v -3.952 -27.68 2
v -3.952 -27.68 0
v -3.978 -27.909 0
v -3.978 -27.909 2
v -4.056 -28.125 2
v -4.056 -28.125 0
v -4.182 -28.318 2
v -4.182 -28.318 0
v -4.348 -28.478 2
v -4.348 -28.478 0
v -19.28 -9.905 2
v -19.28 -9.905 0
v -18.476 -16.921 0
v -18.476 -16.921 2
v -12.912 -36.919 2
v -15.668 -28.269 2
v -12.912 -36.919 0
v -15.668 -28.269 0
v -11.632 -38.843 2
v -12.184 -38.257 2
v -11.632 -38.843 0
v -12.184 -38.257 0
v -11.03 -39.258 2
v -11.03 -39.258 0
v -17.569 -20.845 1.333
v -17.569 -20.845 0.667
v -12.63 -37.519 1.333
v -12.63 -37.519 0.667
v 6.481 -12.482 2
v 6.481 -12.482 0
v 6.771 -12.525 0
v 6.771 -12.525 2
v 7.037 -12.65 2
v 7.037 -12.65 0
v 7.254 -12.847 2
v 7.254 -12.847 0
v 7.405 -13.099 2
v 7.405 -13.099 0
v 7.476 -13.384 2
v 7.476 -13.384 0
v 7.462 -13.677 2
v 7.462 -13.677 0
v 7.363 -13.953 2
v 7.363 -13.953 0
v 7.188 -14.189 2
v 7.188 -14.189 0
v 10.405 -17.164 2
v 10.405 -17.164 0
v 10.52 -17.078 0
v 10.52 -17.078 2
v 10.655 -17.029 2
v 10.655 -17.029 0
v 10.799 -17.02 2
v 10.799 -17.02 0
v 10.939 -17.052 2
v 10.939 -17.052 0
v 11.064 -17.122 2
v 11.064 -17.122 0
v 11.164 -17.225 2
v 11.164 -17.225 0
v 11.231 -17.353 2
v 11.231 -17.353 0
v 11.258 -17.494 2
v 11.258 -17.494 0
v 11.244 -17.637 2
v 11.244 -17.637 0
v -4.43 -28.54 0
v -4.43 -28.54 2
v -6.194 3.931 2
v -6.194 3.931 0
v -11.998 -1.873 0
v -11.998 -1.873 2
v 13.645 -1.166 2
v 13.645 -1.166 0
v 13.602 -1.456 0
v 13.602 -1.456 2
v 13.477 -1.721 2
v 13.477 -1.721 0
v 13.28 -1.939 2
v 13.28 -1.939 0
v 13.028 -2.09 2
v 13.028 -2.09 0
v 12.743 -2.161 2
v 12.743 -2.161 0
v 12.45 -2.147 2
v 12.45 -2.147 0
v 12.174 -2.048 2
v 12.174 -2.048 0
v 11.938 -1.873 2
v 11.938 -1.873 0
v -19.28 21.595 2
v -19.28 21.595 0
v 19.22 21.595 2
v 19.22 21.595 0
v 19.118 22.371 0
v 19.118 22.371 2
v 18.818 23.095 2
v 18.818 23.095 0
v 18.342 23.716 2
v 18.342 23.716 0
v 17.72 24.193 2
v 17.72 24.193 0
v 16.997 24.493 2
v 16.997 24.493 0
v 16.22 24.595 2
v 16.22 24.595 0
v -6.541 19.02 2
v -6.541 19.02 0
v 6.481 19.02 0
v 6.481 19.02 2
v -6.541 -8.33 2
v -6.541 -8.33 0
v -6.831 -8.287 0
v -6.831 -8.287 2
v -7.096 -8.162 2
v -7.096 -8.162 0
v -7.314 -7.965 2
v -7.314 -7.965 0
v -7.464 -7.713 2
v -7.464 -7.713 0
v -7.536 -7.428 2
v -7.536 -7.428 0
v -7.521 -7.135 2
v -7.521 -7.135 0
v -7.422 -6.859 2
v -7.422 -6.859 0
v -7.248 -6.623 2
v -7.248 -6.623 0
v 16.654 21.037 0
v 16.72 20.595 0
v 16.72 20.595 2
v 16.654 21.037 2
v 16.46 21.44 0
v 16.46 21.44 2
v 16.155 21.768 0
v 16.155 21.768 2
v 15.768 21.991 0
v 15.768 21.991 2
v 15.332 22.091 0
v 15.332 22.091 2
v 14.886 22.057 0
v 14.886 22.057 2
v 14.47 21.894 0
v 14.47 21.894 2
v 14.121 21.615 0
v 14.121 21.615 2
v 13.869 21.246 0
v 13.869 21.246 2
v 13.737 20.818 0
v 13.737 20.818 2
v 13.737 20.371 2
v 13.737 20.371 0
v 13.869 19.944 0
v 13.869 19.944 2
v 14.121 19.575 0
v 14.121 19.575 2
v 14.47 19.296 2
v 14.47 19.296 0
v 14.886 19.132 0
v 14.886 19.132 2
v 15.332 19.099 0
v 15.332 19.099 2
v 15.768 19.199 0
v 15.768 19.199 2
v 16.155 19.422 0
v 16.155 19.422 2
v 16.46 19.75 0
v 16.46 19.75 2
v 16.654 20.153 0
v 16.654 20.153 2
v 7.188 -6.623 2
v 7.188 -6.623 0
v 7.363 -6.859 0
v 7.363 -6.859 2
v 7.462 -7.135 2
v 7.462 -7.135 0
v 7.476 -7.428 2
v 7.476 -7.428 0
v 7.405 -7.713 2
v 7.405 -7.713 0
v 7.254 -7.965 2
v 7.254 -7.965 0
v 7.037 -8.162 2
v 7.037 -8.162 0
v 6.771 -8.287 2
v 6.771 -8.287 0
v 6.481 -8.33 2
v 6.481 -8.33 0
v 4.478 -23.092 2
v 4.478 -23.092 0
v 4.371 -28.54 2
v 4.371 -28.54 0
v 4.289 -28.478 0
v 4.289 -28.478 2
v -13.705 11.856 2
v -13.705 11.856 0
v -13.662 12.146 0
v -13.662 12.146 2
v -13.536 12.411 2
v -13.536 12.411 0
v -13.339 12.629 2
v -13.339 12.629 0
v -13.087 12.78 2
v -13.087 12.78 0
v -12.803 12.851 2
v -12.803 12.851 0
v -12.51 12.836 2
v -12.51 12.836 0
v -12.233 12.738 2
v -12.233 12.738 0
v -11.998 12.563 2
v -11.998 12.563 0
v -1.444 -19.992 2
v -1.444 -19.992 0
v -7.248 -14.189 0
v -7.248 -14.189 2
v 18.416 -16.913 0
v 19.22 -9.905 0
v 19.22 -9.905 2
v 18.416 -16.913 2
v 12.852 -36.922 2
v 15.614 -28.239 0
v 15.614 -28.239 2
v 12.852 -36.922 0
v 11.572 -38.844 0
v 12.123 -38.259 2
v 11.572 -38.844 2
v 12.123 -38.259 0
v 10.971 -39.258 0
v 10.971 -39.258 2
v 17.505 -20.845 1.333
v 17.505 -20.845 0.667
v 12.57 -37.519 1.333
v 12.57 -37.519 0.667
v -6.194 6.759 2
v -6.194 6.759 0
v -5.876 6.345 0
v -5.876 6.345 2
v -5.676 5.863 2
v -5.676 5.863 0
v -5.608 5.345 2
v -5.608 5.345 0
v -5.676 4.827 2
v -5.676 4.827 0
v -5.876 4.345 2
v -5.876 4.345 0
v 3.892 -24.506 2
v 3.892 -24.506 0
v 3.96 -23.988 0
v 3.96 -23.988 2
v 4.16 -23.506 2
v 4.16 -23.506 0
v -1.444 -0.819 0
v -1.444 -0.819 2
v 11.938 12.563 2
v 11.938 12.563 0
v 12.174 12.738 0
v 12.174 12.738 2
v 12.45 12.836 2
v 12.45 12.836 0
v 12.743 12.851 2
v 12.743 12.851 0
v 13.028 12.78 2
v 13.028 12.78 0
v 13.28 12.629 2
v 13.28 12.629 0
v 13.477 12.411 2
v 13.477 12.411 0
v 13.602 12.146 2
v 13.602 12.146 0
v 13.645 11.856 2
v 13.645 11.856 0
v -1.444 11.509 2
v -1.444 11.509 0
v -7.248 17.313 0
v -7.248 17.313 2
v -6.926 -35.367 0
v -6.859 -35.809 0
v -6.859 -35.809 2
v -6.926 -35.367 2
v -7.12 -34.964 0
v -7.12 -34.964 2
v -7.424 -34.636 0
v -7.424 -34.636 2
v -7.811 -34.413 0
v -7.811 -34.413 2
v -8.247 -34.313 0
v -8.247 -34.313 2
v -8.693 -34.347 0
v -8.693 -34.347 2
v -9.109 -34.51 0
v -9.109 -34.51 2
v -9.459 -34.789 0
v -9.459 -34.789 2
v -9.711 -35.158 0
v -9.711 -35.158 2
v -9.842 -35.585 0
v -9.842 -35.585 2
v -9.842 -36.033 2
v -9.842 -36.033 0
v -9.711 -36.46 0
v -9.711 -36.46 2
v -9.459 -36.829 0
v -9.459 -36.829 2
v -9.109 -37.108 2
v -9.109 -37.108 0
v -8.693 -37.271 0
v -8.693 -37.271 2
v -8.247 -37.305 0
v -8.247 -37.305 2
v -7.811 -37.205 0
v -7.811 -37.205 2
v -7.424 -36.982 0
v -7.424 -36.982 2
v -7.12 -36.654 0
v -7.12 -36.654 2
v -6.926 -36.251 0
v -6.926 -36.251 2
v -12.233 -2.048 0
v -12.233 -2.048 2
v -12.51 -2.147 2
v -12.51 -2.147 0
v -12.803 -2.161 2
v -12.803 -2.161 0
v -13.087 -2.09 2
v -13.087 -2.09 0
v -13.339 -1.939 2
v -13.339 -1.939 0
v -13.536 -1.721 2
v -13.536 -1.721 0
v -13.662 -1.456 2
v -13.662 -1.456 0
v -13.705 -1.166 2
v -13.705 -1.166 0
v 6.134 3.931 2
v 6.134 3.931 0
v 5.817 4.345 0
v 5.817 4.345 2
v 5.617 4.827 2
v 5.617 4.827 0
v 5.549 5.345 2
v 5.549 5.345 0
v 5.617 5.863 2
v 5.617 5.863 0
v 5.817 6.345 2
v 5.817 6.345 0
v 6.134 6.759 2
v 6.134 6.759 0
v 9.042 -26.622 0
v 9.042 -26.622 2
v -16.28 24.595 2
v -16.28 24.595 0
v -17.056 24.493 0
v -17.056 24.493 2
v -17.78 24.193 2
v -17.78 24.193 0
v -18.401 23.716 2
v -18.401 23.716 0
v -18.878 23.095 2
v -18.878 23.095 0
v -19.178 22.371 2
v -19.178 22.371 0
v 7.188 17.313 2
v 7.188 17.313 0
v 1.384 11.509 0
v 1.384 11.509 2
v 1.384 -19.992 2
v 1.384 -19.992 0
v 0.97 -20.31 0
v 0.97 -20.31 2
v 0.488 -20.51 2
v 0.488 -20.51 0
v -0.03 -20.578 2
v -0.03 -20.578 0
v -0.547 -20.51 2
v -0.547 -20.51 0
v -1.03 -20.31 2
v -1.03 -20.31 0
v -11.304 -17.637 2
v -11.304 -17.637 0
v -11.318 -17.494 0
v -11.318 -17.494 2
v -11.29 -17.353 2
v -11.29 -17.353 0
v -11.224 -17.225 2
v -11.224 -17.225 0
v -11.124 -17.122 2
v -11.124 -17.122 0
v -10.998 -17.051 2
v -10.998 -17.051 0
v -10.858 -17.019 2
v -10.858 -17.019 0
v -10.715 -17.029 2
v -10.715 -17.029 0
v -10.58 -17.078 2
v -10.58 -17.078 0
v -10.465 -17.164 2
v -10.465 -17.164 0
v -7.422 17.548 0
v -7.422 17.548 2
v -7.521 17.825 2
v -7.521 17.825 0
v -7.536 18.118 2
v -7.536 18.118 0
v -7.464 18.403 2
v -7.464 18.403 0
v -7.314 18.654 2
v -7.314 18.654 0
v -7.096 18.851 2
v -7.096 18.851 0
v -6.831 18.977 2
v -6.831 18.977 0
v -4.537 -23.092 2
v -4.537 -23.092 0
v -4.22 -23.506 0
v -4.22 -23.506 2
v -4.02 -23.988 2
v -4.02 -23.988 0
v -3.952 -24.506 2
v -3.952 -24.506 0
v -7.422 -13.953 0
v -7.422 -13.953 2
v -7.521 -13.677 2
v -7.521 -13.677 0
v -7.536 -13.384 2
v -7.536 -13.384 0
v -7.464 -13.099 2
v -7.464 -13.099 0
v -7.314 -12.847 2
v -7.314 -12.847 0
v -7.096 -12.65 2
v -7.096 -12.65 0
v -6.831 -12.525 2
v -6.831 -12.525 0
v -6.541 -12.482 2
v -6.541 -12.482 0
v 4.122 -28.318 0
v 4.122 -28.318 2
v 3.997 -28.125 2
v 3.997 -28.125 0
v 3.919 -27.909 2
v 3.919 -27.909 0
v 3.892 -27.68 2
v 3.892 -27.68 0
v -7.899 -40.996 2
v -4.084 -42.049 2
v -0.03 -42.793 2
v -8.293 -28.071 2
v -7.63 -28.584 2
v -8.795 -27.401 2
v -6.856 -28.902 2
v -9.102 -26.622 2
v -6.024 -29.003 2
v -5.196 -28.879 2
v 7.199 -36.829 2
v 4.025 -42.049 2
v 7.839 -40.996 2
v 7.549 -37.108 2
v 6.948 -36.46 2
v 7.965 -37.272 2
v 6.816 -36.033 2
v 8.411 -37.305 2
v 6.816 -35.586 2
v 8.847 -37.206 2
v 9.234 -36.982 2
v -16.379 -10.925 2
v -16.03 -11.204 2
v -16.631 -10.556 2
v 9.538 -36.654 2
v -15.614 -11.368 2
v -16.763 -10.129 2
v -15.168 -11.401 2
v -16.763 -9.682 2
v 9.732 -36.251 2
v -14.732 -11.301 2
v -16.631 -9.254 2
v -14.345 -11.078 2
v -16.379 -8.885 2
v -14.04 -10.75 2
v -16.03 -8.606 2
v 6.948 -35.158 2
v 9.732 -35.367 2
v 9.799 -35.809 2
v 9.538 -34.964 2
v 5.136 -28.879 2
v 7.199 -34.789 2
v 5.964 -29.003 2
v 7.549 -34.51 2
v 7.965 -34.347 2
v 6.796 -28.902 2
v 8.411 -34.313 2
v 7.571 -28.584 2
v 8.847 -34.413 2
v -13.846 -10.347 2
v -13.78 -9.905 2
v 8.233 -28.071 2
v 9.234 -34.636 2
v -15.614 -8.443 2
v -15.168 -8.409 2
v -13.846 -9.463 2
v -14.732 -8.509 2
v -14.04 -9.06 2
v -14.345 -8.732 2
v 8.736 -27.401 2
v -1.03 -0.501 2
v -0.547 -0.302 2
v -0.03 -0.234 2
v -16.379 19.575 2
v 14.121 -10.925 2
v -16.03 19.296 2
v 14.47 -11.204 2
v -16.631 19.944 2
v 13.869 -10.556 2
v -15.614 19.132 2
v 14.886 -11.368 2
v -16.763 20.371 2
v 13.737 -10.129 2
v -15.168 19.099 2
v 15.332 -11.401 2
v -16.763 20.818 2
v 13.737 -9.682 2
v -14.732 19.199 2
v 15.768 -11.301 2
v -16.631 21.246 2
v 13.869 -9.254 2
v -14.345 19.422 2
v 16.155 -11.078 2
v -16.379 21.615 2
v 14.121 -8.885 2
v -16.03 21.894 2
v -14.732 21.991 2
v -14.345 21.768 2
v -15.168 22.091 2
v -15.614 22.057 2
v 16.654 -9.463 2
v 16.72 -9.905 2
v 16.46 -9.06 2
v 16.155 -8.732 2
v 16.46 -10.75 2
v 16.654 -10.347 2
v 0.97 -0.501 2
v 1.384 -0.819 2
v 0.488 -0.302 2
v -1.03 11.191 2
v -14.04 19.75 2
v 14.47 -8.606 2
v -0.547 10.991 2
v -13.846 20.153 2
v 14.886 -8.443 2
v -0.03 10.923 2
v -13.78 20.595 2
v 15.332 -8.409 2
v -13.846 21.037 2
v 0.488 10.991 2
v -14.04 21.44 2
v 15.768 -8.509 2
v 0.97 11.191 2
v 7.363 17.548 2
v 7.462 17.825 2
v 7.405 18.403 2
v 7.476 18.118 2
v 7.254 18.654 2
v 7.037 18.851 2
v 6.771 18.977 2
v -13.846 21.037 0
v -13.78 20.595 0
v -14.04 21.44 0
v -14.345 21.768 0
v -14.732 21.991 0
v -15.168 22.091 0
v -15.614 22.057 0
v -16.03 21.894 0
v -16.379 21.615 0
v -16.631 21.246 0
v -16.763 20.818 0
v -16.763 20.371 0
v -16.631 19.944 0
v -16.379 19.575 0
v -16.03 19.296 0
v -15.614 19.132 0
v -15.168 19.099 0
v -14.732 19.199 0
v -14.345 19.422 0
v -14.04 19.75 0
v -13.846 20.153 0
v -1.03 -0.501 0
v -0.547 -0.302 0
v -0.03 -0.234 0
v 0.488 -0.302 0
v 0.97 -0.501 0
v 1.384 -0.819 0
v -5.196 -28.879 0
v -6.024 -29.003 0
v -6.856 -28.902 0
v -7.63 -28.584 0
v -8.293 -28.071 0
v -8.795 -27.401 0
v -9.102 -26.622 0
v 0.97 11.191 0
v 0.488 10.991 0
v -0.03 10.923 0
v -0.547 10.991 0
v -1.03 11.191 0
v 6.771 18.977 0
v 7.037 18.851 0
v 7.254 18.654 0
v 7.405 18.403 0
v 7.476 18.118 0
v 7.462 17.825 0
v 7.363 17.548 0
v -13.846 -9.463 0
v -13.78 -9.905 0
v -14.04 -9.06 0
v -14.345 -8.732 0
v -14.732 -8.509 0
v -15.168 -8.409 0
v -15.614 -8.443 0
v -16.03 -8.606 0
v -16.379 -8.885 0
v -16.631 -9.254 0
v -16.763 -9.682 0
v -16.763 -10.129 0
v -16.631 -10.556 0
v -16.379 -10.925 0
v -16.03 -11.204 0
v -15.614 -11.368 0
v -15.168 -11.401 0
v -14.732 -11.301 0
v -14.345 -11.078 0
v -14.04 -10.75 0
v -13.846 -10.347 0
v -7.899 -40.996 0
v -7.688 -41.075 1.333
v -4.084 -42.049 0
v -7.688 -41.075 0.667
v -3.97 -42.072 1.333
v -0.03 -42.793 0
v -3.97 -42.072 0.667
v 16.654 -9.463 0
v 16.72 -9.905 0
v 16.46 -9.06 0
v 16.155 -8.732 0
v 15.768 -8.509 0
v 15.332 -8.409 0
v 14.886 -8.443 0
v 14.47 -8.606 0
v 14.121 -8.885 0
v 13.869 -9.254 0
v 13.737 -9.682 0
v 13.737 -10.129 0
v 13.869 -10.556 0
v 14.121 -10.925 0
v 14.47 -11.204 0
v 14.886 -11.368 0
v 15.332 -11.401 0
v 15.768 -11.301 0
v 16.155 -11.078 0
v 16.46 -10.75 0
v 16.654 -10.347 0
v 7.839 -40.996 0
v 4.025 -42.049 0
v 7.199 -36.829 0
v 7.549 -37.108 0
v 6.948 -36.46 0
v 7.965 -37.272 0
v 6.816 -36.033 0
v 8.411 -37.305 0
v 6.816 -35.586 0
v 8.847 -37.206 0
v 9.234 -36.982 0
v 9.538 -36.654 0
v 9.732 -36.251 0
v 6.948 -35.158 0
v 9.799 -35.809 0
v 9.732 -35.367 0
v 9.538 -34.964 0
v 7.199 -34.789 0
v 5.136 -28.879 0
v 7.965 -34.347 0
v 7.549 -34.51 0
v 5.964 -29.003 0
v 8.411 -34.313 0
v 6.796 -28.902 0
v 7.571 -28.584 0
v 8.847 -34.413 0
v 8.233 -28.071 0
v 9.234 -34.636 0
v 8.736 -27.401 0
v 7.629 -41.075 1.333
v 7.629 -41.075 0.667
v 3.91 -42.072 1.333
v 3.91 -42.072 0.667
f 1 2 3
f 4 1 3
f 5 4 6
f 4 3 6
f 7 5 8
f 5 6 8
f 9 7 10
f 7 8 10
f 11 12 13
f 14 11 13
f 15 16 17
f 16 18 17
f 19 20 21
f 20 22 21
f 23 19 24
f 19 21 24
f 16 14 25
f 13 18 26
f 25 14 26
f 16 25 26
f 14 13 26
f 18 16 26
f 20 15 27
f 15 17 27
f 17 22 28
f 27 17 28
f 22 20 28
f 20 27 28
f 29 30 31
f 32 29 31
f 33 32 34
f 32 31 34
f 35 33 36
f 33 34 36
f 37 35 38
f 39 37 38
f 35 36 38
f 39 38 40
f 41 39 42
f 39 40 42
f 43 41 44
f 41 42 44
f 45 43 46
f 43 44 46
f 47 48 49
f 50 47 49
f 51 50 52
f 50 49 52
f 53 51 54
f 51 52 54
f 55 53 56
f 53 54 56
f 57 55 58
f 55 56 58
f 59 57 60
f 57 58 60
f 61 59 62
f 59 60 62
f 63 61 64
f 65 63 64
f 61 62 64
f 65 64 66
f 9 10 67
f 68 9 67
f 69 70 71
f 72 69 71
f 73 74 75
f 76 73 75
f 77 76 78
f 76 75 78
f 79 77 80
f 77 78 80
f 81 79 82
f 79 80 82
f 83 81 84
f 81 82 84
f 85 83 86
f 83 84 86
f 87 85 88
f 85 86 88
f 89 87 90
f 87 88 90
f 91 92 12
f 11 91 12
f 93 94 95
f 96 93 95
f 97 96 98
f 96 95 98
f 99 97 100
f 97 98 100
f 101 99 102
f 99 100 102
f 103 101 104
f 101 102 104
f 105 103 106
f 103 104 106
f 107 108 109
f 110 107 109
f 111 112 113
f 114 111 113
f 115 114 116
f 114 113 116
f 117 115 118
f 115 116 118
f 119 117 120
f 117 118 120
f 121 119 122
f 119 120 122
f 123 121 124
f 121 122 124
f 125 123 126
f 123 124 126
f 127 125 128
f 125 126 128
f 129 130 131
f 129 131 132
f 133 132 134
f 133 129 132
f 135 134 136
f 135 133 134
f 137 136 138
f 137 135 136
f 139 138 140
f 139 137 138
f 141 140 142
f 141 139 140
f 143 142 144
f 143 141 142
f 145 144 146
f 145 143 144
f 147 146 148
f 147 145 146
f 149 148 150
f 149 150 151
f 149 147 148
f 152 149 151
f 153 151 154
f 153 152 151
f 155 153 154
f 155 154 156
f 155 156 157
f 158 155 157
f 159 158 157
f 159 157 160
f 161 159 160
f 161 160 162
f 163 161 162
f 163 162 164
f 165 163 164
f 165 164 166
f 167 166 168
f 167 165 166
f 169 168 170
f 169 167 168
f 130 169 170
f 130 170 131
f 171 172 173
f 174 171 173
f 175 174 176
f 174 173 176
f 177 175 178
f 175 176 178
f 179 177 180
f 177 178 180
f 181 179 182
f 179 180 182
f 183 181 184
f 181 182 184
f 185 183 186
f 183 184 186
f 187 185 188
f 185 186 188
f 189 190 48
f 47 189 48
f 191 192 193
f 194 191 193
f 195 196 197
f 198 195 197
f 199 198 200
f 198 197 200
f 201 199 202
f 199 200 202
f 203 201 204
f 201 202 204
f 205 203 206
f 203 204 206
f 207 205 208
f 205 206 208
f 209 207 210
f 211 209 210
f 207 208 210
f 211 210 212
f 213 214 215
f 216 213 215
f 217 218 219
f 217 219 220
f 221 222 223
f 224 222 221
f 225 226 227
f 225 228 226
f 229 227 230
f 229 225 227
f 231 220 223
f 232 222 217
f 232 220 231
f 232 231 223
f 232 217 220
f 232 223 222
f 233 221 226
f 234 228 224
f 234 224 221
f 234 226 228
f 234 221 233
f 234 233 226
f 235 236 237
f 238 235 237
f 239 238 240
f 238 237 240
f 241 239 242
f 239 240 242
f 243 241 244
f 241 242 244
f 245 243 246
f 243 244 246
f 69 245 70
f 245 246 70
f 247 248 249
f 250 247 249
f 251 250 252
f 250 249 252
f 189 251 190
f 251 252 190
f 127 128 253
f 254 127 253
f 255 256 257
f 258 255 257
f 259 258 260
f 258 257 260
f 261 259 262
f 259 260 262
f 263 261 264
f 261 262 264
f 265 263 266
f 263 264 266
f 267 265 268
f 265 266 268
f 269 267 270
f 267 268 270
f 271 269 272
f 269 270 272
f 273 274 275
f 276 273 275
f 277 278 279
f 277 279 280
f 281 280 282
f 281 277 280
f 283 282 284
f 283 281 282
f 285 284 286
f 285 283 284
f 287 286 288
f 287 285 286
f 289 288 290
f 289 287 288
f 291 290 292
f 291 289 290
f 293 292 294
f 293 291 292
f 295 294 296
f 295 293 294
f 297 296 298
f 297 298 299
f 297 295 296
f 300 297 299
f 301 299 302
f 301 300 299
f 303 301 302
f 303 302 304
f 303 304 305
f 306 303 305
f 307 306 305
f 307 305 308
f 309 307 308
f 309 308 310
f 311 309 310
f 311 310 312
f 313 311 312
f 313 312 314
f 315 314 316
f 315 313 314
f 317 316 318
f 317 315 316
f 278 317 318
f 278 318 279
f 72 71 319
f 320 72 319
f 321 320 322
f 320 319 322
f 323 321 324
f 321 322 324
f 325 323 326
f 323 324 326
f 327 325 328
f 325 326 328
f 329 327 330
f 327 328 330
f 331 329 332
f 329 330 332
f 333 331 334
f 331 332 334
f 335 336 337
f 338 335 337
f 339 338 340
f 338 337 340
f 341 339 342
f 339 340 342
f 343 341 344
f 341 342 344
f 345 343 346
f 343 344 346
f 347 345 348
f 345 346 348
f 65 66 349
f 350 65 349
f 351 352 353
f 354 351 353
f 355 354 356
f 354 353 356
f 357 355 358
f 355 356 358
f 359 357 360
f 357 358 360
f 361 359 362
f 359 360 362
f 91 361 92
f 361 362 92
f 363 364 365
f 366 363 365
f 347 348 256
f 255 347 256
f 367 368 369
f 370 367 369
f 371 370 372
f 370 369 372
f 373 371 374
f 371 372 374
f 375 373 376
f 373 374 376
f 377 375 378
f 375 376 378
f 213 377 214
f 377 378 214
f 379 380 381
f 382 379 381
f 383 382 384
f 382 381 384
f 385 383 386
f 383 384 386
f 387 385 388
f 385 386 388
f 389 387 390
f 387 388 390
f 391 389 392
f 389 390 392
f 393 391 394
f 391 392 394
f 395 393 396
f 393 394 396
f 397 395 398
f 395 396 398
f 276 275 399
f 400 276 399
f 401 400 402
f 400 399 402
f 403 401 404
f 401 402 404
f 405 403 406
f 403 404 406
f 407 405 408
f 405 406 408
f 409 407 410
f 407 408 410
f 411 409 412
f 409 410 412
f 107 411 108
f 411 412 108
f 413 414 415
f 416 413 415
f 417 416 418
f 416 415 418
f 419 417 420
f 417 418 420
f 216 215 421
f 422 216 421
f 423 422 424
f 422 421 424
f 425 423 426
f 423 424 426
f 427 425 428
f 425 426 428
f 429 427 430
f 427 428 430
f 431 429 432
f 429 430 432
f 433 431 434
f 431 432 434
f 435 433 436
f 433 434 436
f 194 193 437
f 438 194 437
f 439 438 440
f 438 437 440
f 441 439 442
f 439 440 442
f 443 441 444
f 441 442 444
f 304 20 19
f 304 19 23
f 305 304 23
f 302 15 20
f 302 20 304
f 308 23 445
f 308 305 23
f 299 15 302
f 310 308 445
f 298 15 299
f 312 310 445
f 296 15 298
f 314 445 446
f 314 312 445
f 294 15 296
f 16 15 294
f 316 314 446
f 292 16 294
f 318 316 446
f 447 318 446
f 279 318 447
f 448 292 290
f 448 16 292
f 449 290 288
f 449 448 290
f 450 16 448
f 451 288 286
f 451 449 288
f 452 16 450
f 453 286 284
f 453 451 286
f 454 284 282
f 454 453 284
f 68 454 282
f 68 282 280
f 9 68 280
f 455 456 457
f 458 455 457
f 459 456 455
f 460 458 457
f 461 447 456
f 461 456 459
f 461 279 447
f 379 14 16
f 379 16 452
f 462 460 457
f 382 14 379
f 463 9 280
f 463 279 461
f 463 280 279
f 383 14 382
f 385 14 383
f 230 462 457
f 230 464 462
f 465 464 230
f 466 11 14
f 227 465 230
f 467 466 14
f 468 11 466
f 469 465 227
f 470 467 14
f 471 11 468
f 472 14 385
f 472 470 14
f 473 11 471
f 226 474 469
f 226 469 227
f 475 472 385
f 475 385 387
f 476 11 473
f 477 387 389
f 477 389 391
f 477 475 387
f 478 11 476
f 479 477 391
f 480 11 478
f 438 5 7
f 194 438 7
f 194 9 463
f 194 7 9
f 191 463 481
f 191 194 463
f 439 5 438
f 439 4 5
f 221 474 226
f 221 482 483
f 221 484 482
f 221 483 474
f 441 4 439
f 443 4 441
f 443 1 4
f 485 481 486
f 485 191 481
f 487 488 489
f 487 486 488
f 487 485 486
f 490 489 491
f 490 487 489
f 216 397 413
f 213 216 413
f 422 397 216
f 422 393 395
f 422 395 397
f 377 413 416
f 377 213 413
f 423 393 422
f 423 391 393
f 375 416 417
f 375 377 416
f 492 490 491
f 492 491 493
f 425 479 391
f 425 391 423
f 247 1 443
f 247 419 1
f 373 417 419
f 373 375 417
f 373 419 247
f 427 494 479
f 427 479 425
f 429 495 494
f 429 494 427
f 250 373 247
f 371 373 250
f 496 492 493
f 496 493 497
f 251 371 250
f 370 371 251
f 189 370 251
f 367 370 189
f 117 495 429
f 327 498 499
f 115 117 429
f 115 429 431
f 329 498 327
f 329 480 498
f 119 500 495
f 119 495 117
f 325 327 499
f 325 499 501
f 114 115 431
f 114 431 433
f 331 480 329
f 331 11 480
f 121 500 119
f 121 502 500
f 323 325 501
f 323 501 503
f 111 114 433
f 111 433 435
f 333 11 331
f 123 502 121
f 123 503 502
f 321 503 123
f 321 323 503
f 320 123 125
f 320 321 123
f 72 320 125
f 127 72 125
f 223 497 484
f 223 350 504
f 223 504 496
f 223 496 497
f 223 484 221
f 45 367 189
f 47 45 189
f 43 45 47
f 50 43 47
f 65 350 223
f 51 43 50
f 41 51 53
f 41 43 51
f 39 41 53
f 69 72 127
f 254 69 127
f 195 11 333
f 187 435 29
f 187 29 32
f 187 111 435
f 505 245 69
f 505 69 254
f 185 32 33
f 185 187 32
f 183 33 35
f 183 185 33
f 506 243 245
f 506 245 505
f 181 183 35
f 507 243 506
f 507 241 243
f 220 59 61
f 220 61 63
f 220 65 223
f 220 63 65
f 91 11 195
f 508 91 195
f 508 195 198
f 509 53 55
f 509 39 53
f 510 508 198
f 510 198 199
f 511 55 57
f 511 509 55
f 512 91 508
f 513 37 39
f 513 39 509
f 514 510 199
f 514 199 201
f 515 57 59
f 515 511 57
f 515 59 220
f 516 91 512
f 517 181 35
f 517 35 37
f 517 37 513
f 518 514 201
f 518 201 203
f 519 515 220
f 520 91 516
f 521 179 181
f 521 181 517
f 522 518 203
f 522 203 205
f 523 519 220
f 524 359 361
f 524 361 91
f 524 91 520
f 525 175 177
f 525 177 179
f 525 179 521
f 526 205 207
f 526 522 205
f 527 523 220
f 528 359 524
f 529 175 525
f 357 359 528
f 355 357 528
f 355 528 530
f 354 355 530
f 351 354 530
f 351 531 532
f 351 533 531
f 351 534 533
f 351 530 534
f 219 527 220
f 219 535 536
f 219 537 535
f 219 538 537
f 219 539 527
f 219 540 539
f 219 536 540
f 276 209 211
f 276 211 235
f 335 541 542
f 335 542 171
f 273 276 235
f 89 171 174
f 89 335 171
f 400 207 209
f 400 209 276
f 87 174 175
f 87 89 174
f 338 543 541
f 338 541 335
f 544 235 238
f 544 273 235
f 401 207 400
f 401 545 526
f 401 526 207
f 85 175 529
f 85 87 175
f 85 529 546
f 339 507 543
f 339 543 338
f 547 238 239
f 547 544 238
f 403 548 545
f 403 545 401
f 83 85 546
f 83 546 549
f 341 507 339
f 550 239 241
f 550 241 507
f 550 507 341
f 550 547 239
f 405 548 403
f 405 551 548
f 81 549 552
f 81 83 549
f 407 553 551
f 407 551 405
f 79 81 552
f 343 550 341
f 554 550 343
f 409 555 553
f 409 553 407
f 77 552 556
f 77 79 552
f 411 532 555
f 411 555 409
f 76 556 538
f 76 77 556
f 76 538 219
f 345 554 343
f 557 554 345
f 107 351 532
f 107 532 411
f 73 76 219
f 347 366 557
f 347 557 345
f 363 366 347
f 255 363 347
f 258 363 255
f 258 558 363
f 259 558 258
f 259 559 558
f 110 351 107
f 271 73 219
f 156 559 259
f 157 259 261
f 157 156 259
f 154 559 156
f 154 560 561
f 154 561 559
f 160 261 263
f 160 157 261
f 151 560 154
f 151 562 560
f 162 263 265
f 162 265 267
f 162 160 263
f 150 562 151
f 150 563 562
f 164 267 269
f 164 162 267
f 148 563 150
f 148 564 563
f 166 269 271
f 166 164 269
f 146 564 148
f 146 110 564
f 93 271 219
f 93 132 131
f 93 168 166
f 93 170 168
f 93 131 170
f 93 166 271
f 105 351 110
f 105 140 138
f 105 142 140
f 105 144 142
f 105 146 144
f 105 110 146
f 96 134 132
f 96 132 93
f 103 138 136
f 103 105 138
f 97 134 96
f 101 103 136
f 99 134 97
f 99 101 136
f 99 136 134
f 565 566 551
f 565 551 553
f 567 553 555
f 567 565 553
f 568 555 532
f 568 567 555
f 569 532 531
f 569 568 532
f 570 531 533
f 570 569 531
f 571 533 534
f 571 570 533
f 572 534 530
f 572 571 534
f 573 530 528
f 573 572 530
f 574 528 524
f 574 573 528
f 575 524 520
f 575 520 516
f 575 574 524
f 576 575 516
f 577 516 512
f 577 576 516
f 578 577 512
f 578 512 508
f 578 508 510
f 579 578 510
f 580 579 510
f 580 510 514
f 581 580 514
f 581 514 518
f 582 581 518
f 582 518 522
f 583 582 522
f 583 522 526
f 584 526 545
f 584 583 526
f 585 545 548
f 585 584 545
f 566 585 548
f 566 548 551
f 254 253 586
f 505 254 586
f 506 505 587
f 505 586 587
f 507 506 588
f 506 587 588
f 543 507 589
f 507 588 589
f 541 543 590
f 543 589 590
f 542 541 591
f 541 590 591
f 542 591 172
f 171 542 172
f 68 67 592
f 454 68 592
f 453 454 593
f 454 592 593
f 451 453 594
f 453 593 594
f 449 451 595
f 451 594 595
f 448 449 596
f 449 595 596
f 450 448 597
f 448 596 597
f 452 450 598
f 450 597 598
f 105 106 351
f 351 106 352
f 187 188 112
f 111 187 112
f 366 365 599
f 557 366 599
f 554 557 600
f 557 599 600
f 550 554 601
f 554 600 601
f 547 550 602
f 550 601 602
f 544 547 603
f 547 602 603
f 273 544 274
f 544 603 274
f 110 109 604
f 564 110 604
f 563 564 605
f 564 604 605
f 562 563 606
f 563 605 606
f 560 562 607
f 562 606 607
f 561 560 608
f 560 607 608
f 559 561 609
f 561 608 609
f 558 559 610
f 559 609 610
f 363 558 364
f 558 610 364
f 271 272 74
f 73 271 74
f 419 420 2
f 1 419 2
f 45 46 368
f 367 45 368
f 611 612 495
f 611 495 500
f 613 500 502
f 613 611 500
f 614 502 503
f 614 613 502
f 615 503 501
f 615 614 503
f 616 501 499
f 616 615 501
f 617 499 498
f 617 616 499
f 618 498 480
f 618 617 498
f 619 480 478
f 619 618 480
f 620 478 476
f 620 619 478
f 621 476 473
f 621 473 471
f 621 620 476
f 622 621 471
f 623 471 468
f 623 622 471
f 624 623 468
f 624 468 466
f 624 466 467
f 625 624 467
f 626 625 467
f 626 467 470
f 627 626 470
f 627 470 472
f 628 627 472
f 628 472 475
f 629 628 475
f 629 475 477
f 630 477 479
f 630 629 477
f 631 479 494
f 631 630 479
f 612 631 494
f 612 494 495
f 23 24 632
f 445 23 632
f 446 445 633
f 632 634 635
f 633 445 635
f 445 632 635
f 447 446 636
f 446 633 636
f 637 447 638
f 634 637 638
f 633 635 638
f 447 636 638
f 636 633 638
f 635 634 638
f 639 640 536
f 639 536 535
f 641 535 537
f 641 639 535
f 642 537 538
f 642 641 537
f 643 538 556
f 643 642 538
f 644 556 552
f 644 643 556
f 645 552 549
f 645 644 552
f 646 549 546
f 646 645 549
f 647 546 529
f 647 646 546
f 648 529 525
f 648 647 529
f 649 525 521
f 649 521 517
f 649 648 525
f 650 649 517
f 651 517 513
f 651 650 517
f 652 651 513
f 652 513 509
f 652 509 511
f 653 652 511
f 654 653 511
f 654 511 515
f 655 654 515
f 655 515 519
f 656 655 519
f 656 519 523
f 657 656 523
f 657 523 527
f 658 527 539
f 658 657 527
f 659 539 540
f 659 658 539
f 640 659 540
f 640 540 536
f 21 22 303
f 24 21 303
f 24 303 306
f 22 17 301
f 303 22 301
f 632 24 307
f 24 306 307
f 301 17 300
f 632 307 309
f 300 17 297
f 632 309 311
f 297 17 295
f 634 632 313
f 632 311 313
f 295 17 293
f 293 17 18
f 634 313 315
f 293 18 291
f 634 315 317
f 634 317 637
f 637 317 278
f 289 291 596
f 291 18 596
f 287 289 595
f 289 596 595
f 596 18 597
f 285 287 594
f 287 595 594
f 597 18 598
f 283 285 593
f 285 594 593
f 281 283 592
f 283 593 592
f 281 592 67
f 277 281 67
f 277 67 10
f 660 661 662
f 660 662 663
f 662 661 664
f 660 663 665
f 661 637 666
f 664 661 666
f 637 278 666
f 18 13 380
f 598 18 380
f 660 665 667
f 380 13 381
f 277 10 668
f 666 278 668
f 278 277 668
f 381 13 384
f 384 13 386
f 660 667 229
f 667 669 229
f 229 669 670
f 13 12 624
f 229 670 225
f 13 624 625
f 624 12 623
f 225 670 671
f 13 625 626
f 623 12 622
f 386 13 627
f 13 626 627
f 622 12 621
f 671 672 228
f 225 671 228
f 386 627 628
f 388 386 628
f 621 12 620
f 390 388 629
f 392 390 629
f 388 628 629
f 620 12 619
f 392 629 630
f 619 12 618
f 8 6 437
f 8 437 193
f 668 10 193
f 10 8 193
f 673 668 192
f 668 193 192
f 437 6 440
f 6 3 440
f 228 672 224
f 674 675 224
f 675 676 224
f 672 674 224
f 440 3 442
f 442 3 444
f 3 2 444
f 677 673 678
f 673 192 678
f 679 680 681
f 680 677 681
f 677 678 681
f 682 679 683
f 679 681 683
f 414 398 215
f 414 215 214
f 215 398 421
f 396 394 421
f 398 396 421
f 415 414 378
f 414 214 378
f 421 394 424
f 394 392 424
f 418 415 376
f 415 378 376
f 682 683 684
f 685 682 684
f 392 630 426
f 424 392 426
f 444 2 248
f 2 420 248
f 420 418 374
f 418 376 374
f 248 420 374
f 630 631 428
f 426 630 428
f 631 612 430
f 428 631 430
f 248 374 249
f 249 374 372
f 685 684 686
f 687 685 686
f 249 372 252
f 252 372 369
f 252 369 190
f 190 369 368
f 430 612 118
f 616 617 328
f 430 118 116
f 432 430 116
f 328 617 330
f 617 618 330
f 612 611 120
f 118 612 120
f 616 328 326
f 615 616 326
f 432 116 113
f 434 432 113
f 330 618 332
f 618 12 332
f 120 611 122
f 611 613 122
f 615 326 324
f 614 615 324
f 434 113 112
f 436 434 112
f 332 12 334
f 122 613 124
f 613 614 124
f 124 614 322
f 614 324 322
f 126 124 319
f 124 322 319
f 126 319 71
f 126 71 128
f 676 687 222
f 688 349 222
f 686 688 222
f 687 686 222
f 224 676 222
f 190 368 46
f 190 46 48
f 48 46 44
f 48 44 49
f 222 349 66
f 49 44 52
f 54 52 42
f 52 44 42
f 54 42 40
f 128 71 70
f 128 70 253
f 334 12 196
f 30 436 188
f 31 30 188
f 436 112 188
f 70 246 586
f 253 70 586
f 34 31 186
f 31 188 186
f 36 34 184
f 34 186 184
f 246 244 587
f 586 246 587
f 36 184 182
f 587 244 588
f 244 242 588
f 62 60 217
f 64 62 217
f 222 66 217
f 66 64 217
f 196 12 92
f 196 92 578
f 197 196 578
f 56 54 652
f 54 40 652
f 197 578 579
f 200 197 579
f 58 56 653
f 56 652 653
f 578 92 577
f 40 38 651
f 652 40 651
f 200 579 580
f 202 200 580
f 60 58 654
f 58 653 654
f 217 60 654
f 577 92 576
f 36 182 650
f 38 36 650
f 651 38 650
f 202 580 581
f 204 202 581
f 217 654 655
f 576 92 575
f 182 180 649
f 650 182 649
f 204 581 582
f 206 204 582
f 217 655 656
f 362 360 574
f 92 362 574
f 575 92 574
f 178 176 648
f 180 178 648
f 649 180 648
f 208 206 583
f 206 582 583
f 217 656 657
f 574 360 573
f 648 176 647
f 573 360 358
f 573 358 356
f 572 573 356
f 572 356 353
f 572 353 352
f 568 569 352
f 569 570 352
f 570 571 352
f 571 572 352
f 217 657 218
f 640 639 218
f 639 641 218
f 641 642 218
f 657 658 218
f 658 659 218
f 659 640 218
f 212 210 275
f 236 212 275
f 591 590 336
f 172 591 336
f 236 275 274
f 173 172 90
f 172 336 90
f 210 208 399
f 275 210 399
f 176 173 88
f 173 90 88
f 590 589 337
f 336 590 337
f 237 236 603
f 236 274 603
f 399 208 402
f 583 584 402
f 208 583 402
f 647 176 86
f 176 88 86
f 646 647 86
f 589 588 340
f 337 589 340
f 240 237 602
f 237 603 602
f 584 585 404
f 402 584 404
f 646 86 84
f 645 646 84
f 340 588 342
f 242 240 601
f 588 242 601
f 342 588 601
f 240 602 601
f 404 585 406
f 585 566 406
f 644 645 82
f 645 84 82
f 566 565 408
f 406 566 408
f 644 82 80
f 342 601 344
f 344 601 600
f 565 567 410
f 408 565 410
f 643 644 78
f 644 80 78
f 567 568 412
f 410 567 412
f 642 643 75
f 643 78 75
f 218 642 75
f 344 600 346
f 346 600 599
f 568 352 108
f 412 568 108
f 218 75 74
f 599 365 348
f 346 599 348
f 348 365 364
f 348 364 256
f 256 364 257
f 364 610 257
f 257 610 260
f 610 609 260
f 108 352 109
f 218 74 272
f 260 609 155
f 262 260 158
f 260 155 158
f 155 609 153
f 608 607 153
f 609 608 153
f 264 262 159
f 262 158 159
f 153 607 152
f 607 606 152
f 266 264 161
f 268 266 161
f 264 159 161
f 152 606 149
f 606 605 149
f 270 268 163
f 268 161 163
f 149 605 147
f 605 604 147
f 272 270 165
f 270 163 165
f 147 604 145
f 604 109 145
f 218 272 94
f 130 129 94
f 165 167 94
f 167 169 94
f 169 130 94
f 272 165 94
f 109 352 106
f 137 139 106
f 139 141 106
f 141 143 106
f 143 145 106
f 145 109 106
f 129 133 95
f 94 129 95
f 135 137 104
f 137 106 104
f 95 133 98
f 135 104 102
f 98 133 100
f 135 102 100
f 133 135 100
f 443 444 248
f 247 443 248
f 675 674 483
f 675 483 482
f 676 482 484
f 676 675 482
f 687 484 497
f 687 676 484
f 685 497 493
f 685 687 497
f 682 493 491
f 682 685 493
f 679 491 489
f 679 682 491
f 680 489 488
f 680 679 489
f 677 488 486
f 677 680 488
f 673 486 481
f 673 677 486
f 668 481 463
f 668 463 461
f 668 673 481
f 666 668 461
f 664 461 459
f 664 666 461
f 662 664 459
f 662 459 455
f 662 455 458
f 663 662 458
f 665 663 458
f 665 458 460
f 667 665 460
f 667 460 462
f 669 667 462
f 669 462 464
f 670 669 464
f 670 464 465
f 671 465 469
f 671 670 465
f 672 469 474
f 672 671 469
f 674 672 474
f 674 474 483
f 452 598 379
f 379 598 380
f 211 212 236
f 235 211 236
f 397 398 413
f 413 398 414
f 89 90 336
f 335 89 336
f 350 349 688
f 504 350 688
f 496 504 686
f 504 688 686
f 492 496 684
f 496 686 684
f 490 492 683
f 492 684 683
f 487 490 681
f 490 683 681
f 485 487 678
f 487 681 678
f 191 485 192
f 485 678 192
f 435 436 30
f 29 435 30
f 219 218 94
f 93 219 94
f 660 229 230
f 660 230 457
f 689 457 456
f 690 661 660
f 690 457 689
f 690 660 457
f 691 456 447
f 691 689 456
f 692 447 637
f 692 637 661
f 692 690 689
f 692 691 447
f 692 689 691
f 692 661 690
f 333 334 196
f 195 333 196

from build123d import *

# Parameters (mm, degrees)
F0_R     = 1.5
F1_DEPTH = 2


with BuildPart() as f1:
    # F0 (on Top) → F1 (new body)
    with BuildSketch(Plane.XY):
        with BuildLine():
            add(Edge.make_bspline(
                [(-19.2797562629, -9.905116457), (-19.0982468003, -14.4101153328), (-17.9920827376, -19.3739666304), (-13.308328145, -37.7679285444), (-11.6351514357, -38.8801394619), (-11.0301110372, -39.2582418919)],
                knots=[0, 0, 0, 0, 0.3683029461, 0.8298524693, 1, 1, 1, 1], degree=3))
            add(Edge.make_bspline(
                [(-11.0301110372, -39.2582418919), (-7.9284483046, -41.6670267819), (-4.0292758905, -42.0286703297), (-0.0297562629, -42.7926565894)],
                knots=[0, 0, 0, 0, 11.5542153526, 11.5542153526, 11.5542153526, 11.5542153526], degree=3))
            add(Edge.make_bspline(
                [(10.9705985114, -39.2582418919), (7.8689357787, -41.6670267819), (3.9697633646, -42.0286703297), (-0.0297562629, -42.7926565894)],
                knots=[0, 0, 0, 0, 11.5542153526, 11.5542153526, 11.5542153526, 11.5542153526], degree=3))
            add(Edge.make_bspline(
                [(19.2202437371, -9.905116457), (19.036977504, -14.4100339649), (17.9265362965, -19.3734899796), (13.2492727498, -37.7680162572), (11.5757589717, -38.88017148), (10.9705985114, -39.2582418919)],
                knots=[0, 0, 0, 0, 0.368314136, 0.829851714, 1, 1, 1, 1], degree=3))
            Line((19.2202437371, -9.905116457), (19.2202437371, 20.594883543))
            Line((19.2202437371, 20.594883543), (19.2202437371, 21.594883543))
            ThreePointArc((19.2202437371, 21.594883543), (18.3415640806, 23.7162038866), (16.2202437371, 24.594883543))
            Line((16.2202437371, 24.594883543), (0, 24.594883543))
            Line((0, 24.594883543), (-16.2797562629, 24.594883543))
            ThreePointArc((-16.2797562629, 24.594883543), (-18.4010766065, 23.7162038866), (-19.2797562629, 21.594883543))
            Line((-19.2797562629, 21.594883543), (-19.2797562629, 20.594883543))
            Line((-19.2797562629, 20.594883543), (-19.2797562629, -9.905116457))
        make_face()
        with Locations((-8.3591040188, -35.8089955406)):
            Circle(F0_R, mode=Mode.SUBTRACT)
        with Locations((-15.2797562629, -9.905116457)):
            Circle(F0_R, mode=Mode.SUBTRACT)
        with BuildLine():
            ThreePointArc((-11.3039357928, -17.6368901423), (-11.0636435897, -17.0822070704), (-10.4647527012, -17.1643250148))
            Line((-10.4647527012, -17.1643250148), (-4.5373681075, -23.0917096085))
            ThreePointArc((-4.5373681075, -23.0917096085), (-4.1038226049, -23.7405563062), (-3.9515816699, -24.5059231709))
            Line((-3.9515816699, -24.5059231709), (-3.9515816699, -27.680122055))
            ThreePointArc((-3.9515816699, -27.680122055), (-4.0562159615, -28.1254536709), (-4.3482221662, -28.4775913706))
            Line((-4.3482221662, -28.4775913706), (-4.4300632592, -28.5395117484))
            ThreePointArc((-4.4300632592, -28.5395117484), (-7.2536293499, -28.7688377699), (-9.1019734581, -26.6220401664))
            Line((-9.1019734581, -26.6220401664), (-11.3039357928, -17.6368901423))
        make_face(mode=Mode.SUBTRACT)
        with BuildLine():
            Line((-1.4439698253, -19.9923775593), (-7.2476494818, -14.1886979028))
            ThreePointArc((-7.2476494818, -14.1886979028), (-7.4644222331, -13.0989076893), (-6.5405427006, -12.4815911217))
            Line((-6.5405427006, -12.4815911217), (6.4810301747, -12.4815911217))
            ThreePointArc((6.4810301747, -12.4815911217), (7.4049097072, -13.0989076893), (7.1881369559, -14.1886979028))
            Line((7.1881369559, -14.1886979028), (1.3844572994, -19.9923775593))
            ThreePointArc((1.3844572994, -19.9923775593), (-0.0297562629, -20.5781639969), (-1.4439698253, -19.9923775593))
        make_face(mode=Mode.SUBTRACT)
        with Locations((8.2990484464, -35.8092267746)):
            Circle(F0_R, mode=Mode.SUBTRACT)
        with BuildLine():
            Line((4.4778555816, -23.0917096085), (10.405156074, -17.1644091162))
            ThreePointArc((10.405156074, -17.1644091162), (11.0040544707, -17.0822954), (11.2443350632, -17.6369909821))
            Line((11.2443350632, -17.6369909821), (9.042069144, -26.6220401664))
            ThreePointArc((9.042069144, -26.6220401664), (7.1939906468, -28.7689578546), (4.3705127945, -28.5395618872))
            Line((4.3705127945, -28.5395618872), (4.2886260755, -28.477593495))
            ThreePointArc((4.2886260755, -28.477593495), (3.9966801033, -28.1254721127), (3.892069144, -27.6801874108))
            Line((3.892069144, -27.6801874108), (3.892069144, -24.5059231709))
            ThreePointArc((3.892069144, -24.5059231709), (4.044310079, -23.7405563062), (4.4778555816, -23.0917096085))
        make_face(mode=Mode.SUBTRACT)
        with Locations((15.2202437371, -9.905116457)):
            Circle(F0_R, mode=Mode.SUBTRACT)
        with BuildLine():
            Line((-11.9976494818, 12.5627767618), (-6.1939698253, 6.7590971054))
            ThreePointArc((-6.1939698253, 6.7590971054), (-5.6081833877, 5.344883543), (-6.1939698253, 3.9306699806))
            Line((-6.1939698253, 3.9306699806), (-11.9976494818, -1.8730096758))
            ThreePointArc((-11.9976494818, -1.8730096758), (-13.0874396953, -2.0897824271), (-13.7047562629, -1.1659028946))
            Line((-13.7047562629, -1.1659028946), (-13.7047562629, 11.8556699806))
            ThreePointArc((-13.7047562629, 11.8556699806), (-13.0874396953, 12.7795495132), (-11.9976494818, 12.5627767618))
        make_face(mode=Mode.SUBTRACT)
        with BuildLine():
            ThreePointArc((-1.4439698253, -0.8193300194), (-0.0297562629, -0.2335435817), (1.3844572994, -0.8193300194))
            Line((1.3844572994, -0.8193300194), (7.1881369559, -6.6230096758))
            ThreePointArc((7.1881369559, -6.6230096758), (7.4049097072, -7.7127998894), (6.4810301747, -8.330116457))
            Line((6.4810301747, -8.330116457), (-6.5405427006, -8.330116457))
            ThreePointArc((-6.5405427006, -8.330116457), (-7.4644222331, -7.7127998894), (-7.2476494818, -6.6230096758))
            Line((-7.2476494818, -6.6230096758), (-1.4439698253, -0.8193300194))
        make_face(mode=Mode.SUBTRACT)
        with Locations((-15.2797562629, 20.594883543)):
            Circle(F0_R, mode=Mode.SUBTRACT)
        with BuildLine():
            ThreePointArc((1.3844572994, 11.5090971054), (-0.0297562629, 10.9233106678), (-1.4439698253, 11.5090971054))
            Line((-1.4439698253, 11.5090971054), (-7.2476494818, 17.3127767618))
            ThreePointArc((-7.2476494818, 17.3127767618), (-7.4644222331, 18.4025669754), (-6.5405427006, 19.019883543))
            Line((-6.5405427006, 19.019883543), (6.4810301747, 19.019883543))
            ThreePointArc((6.4810301747, 19.019883543), (7.4049097072, 18.4025669754), (7.1881369559, 17.3127767618))
            Line((7.1881369559, 17.3127767618), (1.3844572994, 11.5090971054))
        make_face(mode=Mode.SUBTRACT)
        with BuildLine():
            Line((11.9381369559, -1.8730096758), (6.1344572994, 3.9306699806))
            ThreePointArc((6.1344572994, 3.9306699806), (5.5486708618, 5.344883543), (6.1344572994, 6.7590971054))
            Line((6.1344572994, 6.7590971054), (11.9381369559, 12.5627767618))
            ThreePointArc((11.9381369559, 12.5627767618), (13.0279271694, 12.7795495132), (13.6452437371, 11.8556699806))
            Line((13.6452437371, 11.8556699806), (13.6452437371, -1.1659028946))
            ThreePointArc((13.6452437371, -1.1659028946), (13.0279271694, -2.0897824271), (11.9381369559, -1.8730096758))
        make_face(mode=Mode.SUBTRACT)
        with Locations((15.2202437371, 20.594883543)):
            Circle(F0_R, mode=Mode.SUBTRACT)
    extrude(amount=F1_DEPTH)


solid = f1.part
